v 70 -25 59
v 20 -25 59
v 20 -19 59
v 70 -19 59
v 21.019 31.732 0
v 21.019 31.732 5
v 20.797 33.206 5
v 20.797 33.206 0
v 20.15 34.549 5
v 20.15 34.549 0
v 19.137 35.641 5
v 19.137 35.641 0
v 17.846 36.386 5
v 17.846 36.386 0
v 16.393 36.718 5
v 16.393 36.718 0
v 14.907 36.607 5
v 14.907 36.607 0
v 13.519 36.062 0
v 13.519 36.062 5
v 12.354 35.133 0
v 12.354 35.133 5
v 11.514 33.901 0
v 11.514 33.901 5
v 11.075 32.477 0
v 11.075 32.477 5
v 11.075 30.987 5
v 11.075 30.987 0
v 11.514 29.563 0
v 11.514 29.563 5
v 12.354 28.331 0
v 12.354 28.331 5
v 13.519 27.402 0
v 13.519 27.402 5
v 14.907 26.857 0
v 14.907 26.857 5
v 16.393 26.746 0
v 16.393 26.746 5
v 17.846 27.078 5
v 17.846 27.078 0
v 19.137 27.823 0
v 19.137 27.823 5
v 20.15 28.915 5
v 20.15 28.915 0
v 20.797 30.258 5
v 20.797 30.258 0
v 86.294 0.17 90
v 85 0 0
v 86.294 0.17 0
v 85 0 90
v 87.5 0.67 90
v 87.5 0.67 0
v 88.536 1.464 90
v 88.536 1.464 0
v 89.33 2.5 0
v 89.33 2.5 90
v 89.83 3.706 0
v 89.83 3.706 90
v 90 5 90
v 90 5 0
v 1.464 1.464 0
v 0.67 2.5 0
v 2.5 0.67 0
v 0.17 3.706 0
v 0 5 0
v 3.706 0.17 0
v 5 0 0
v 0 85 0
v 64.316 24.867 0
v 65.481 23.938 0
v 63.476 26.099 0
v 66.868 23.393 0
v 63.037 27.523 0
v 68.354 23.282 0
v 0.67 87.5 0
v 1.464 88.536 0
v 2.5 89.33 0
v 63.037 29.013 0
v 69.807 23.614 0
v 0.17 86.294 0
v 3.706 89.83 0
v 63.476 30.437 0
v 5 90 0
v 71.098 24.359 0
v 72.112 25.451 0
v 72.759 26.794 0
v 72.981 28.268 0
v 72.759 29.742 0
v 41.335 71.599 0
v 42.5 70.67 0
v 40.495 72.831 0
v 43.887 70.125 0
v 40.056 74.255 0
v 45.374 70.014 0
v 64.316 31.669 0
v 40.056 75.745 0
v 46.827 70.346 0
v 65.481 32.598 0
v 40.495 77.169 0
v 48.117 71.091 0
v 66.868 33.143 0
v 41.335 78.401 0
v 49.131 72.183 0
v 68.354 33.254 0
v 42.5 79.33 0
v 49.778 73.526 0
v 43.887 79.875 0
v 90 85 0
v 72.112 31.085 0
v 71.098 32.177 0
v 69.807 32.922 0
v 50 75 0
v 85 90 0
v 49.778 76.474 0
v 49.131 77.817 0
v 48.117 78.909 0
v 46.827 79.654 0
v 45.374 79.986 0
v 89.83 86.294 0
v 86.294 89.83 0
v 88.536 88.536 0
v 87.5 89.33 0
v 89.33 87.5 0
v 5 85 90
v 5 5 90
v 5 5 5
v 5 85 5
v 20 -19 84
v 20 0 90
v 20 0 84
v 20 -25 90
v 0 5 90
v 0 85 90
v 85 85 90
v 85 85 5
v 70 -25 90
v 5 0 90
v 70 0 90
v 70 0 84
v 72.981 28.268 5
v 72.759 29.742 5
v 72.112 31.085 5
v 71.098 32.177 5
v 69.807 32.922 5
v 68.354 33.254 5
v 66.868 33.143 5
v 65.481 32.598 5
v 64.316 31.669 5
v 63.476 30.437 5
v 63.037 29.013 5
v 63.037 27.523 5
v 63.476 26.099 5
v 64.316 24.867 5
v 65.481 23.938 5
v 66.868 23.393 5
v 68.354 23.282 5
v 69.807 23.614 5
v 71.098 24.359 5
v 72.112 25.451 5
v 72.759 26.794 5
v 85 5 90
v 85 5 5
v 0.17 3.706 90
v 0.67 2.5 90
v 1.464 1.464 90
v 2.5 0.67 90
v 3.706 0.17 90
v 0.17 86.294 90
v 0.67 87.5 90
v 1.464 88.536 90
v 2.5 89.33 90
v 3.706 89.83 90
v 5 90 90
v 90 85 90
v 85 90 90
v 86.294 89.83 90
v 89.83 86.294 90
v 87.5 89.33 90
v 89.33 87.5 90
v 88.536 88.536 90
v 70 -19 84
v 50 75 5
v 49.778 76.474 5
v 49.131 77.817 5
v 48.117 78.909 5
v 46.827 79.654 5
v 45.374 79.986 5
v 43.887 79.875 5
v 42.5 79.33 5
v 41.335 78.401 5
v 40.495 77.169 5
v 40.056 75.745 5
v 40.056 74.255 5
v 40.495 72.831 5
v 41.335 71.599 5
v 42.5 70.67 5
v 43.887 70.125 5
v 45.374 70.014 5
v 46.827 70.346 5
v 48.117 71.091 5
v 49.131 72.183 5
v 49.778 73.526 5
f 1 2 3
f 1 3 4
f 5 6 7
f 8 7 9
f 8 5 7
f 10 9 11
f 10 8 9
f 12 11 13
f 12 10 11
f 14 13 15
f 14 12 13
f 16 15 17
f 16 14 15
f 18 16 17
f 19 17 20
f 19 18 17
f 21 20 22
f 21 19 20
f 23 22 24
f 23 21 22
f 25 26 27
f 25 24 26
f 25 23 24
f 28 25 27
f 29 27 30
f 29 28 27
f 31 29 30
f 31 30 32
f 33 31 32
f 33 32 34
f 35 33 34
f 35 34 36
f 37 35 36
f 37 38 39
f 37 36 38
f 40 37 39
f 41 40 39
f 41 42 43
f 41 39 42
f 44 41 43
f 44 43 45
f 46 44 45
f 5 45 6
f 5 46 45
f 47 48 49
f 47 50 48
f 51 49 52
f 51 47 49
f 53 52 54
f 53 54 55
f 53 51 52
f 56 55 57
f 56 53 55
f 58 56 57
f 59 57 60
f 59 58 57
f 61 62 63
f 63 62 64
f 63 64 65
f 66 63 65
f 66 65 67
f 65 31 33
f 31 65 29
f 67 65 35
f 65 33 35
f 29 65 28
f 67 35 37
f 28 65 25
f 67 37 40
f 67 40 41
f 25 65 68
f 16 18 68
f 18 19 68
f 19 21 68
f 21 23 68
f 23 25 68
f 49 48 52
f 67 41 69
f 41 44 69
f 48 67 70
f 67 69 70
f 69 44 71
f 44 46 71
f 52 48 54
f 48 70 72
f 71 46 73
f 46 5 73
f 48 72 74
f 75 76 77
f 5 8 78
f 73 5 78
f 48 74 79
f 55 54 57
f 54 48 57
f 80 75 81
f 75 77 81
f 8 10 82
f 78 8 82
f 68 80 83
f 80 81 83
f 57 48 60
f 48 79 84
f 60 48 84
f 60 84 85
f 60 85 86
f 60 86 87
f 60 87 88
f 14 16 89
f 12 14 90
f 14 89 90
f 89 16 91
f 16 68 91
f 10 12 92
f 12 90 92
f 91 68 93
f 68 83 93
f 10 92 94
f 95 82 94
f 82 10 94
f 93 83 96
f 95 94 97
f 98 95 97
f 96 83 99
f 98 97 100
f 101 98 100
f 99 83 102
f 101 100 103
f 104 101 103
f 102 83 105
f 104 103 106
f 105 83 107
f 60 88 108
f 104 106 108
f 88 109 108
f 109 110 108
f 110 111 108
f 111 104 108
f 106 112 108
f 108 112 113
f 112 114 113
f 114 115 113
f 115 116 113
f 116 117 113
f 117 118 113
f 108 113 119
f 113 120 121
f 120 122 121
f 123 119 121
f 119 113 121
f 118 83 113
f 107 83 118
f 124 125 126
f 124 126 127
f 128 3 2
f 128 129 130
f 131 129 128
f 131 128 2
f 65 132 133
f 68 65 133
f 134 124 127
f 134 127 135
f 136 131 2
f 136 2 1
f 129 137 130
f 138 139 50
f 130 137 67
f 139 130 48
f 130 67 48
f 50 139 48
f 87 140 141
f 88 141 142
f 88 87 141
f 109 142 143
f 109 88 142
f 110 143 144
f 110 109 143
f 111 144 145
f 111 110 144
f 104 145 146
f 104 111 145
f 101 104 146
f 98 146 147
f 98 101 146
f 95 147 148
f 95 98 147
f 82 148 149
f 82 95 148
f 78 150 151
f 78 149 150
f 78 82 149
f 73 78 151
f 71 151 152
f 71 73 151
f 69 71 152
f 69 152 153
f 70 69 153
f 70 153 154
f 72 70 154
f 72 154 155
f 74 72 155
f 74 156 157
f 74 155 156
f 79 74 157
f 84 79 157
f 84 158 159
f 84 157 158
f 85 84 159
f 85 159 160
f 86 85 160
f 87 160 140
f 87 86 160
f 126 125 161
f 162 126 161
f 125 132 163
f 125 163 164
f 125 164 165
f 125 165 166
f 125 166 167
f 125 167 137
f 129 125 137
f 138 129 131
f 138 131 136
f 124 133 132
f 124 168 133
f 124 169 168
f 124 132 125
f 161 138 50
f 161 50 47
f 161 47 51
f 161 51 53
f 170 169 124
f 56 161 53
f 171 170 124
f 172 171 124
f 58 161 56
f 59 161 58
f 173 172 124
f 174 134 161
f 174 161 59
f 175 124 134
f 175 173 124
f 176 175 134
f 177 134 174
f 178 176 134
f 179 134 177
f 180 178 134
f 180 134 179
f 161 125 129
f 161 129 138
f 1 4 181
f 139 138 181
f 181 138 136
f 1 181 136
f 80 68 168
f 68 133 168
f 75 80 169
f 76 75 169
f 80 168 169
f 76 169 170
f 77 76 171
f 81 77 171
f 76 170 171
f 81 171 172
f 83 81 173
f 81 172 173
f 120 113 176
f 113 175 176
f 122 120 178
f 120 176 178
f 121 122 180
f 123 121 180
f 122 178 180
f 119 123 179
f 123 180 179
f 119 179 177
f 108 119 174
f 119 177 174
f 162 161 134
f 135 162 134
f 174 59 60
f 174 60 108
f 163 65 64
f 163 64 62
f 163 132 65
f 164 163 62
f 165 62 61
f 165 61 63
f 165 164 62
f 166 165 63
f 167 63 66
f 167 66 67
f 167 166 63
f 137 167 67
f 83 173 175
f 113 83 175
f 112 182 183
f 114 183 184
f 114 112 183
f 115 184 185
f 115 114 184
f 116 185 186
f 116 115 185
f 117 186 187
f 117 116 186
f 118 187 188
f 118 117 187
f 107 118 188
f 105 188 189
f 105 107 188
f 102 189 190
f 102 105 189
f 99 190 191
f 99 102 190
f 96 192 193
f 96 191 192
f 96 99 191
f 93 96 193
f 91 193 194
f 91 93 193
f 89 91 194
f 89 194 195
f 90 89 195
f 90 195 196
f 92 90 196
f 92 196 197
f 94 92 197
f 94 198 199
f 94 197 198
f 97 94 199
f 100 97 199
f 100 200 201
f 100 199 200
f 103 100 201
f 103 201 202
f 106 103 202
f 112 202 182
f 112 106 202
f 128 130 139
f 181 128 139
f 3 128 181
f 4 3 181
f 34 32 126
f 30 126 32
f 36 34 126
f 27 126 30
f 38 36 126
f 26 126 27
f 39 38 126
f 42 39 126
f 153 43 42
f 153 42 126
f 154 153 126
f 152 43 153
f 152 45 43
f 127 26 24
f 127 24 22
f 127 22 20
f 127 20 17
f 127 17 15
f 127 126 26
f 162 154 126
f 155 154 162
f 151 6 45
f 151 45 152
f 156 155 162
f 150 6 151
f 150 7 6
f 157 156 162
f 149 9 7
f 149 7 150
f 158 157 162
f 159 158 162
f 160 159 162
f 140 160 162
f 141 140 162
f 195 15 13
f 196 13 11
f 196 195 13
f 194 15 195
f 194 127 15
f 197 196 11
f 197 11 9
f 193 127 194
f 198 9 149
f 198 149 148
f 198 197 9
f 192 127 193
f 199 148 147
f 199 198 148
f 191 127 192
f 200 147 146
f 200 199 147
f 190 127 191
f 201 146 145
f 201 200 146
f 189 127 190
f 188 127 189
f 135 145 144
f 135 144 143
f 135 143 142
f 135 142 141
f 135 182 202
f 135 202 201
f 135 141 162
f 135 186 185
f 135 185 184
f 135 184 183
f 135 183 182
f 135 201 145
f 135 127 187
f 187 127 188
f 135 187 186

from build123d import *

# Parameters (mm, degrees)
F0_W     = 90
F0_H     = 90
F0_R     = 5
F1_DEPTH = 90
F2_R     = 5
F3_W     = 80
F3_H     = 80
F4_DEPTH = 85
F5_W     = 50
F5_H     = 6
F6_DEPTH = 25
F7_W     = 50
F7_H     = 6
F8_DEPTH = 25


with BuildPart() as f1:
    # F0 (on Top) → F1 (new body)
    with BuildSketch(Plane.XY):
        with Locations((45, 45)):
            Rectangle(F0_W, F0_H)
        with Locations((16.019238, 31.732051)):
            Circle(F0_R, mode=Mode.SUBTRACT)
        with Locations((67.980762, 28.267949)):
            Circle(F0_R, mode=Mode.SUBTRACT)
        with Locations((45, 75)):
            Circle(F0_R, mode=Mode.SUBTRACT)
    extrude(amount=F1_DEPTH)

    # F2
    f2_edges = [f1.edges().sort_by_distance(p)[0] for p in [
        (90, 0, 45),
        (90, 90, 45),
        (0, 0, 45),
        (0, 90, 45),
    ]]
    fillet(f2_edges, radius=F2_R)

    # F3 (on face) → F4 (cut)
    with BuildSketch(Plane.XY.offset(90)):
        with Locations((45, 45)):
            Rectangle(F3_W, F3_H)
    extrude(amount=-F4_DEPTH, mode=Mode.SUBTRACT)

    # F5 (on face) → F6 (join)
    with BuildSketch(Plane.XZ):
        with Locations((45, 87)):
            Rectangle(F5_W, F5_H)
    extrude(amount=F6_DEPTH)

    # F7 (on face) → F8 (join)
    with BuildSketch(Plane(origin=(0, 0, 84), x_dir=(1, 0, 0), z_dir=(0, 0, -1))):
        with Locations((45, 22)):
            Rectangle(F7_W, F7_H)
    extrude(amount=F8_DEPTH)


solid = f1.part
